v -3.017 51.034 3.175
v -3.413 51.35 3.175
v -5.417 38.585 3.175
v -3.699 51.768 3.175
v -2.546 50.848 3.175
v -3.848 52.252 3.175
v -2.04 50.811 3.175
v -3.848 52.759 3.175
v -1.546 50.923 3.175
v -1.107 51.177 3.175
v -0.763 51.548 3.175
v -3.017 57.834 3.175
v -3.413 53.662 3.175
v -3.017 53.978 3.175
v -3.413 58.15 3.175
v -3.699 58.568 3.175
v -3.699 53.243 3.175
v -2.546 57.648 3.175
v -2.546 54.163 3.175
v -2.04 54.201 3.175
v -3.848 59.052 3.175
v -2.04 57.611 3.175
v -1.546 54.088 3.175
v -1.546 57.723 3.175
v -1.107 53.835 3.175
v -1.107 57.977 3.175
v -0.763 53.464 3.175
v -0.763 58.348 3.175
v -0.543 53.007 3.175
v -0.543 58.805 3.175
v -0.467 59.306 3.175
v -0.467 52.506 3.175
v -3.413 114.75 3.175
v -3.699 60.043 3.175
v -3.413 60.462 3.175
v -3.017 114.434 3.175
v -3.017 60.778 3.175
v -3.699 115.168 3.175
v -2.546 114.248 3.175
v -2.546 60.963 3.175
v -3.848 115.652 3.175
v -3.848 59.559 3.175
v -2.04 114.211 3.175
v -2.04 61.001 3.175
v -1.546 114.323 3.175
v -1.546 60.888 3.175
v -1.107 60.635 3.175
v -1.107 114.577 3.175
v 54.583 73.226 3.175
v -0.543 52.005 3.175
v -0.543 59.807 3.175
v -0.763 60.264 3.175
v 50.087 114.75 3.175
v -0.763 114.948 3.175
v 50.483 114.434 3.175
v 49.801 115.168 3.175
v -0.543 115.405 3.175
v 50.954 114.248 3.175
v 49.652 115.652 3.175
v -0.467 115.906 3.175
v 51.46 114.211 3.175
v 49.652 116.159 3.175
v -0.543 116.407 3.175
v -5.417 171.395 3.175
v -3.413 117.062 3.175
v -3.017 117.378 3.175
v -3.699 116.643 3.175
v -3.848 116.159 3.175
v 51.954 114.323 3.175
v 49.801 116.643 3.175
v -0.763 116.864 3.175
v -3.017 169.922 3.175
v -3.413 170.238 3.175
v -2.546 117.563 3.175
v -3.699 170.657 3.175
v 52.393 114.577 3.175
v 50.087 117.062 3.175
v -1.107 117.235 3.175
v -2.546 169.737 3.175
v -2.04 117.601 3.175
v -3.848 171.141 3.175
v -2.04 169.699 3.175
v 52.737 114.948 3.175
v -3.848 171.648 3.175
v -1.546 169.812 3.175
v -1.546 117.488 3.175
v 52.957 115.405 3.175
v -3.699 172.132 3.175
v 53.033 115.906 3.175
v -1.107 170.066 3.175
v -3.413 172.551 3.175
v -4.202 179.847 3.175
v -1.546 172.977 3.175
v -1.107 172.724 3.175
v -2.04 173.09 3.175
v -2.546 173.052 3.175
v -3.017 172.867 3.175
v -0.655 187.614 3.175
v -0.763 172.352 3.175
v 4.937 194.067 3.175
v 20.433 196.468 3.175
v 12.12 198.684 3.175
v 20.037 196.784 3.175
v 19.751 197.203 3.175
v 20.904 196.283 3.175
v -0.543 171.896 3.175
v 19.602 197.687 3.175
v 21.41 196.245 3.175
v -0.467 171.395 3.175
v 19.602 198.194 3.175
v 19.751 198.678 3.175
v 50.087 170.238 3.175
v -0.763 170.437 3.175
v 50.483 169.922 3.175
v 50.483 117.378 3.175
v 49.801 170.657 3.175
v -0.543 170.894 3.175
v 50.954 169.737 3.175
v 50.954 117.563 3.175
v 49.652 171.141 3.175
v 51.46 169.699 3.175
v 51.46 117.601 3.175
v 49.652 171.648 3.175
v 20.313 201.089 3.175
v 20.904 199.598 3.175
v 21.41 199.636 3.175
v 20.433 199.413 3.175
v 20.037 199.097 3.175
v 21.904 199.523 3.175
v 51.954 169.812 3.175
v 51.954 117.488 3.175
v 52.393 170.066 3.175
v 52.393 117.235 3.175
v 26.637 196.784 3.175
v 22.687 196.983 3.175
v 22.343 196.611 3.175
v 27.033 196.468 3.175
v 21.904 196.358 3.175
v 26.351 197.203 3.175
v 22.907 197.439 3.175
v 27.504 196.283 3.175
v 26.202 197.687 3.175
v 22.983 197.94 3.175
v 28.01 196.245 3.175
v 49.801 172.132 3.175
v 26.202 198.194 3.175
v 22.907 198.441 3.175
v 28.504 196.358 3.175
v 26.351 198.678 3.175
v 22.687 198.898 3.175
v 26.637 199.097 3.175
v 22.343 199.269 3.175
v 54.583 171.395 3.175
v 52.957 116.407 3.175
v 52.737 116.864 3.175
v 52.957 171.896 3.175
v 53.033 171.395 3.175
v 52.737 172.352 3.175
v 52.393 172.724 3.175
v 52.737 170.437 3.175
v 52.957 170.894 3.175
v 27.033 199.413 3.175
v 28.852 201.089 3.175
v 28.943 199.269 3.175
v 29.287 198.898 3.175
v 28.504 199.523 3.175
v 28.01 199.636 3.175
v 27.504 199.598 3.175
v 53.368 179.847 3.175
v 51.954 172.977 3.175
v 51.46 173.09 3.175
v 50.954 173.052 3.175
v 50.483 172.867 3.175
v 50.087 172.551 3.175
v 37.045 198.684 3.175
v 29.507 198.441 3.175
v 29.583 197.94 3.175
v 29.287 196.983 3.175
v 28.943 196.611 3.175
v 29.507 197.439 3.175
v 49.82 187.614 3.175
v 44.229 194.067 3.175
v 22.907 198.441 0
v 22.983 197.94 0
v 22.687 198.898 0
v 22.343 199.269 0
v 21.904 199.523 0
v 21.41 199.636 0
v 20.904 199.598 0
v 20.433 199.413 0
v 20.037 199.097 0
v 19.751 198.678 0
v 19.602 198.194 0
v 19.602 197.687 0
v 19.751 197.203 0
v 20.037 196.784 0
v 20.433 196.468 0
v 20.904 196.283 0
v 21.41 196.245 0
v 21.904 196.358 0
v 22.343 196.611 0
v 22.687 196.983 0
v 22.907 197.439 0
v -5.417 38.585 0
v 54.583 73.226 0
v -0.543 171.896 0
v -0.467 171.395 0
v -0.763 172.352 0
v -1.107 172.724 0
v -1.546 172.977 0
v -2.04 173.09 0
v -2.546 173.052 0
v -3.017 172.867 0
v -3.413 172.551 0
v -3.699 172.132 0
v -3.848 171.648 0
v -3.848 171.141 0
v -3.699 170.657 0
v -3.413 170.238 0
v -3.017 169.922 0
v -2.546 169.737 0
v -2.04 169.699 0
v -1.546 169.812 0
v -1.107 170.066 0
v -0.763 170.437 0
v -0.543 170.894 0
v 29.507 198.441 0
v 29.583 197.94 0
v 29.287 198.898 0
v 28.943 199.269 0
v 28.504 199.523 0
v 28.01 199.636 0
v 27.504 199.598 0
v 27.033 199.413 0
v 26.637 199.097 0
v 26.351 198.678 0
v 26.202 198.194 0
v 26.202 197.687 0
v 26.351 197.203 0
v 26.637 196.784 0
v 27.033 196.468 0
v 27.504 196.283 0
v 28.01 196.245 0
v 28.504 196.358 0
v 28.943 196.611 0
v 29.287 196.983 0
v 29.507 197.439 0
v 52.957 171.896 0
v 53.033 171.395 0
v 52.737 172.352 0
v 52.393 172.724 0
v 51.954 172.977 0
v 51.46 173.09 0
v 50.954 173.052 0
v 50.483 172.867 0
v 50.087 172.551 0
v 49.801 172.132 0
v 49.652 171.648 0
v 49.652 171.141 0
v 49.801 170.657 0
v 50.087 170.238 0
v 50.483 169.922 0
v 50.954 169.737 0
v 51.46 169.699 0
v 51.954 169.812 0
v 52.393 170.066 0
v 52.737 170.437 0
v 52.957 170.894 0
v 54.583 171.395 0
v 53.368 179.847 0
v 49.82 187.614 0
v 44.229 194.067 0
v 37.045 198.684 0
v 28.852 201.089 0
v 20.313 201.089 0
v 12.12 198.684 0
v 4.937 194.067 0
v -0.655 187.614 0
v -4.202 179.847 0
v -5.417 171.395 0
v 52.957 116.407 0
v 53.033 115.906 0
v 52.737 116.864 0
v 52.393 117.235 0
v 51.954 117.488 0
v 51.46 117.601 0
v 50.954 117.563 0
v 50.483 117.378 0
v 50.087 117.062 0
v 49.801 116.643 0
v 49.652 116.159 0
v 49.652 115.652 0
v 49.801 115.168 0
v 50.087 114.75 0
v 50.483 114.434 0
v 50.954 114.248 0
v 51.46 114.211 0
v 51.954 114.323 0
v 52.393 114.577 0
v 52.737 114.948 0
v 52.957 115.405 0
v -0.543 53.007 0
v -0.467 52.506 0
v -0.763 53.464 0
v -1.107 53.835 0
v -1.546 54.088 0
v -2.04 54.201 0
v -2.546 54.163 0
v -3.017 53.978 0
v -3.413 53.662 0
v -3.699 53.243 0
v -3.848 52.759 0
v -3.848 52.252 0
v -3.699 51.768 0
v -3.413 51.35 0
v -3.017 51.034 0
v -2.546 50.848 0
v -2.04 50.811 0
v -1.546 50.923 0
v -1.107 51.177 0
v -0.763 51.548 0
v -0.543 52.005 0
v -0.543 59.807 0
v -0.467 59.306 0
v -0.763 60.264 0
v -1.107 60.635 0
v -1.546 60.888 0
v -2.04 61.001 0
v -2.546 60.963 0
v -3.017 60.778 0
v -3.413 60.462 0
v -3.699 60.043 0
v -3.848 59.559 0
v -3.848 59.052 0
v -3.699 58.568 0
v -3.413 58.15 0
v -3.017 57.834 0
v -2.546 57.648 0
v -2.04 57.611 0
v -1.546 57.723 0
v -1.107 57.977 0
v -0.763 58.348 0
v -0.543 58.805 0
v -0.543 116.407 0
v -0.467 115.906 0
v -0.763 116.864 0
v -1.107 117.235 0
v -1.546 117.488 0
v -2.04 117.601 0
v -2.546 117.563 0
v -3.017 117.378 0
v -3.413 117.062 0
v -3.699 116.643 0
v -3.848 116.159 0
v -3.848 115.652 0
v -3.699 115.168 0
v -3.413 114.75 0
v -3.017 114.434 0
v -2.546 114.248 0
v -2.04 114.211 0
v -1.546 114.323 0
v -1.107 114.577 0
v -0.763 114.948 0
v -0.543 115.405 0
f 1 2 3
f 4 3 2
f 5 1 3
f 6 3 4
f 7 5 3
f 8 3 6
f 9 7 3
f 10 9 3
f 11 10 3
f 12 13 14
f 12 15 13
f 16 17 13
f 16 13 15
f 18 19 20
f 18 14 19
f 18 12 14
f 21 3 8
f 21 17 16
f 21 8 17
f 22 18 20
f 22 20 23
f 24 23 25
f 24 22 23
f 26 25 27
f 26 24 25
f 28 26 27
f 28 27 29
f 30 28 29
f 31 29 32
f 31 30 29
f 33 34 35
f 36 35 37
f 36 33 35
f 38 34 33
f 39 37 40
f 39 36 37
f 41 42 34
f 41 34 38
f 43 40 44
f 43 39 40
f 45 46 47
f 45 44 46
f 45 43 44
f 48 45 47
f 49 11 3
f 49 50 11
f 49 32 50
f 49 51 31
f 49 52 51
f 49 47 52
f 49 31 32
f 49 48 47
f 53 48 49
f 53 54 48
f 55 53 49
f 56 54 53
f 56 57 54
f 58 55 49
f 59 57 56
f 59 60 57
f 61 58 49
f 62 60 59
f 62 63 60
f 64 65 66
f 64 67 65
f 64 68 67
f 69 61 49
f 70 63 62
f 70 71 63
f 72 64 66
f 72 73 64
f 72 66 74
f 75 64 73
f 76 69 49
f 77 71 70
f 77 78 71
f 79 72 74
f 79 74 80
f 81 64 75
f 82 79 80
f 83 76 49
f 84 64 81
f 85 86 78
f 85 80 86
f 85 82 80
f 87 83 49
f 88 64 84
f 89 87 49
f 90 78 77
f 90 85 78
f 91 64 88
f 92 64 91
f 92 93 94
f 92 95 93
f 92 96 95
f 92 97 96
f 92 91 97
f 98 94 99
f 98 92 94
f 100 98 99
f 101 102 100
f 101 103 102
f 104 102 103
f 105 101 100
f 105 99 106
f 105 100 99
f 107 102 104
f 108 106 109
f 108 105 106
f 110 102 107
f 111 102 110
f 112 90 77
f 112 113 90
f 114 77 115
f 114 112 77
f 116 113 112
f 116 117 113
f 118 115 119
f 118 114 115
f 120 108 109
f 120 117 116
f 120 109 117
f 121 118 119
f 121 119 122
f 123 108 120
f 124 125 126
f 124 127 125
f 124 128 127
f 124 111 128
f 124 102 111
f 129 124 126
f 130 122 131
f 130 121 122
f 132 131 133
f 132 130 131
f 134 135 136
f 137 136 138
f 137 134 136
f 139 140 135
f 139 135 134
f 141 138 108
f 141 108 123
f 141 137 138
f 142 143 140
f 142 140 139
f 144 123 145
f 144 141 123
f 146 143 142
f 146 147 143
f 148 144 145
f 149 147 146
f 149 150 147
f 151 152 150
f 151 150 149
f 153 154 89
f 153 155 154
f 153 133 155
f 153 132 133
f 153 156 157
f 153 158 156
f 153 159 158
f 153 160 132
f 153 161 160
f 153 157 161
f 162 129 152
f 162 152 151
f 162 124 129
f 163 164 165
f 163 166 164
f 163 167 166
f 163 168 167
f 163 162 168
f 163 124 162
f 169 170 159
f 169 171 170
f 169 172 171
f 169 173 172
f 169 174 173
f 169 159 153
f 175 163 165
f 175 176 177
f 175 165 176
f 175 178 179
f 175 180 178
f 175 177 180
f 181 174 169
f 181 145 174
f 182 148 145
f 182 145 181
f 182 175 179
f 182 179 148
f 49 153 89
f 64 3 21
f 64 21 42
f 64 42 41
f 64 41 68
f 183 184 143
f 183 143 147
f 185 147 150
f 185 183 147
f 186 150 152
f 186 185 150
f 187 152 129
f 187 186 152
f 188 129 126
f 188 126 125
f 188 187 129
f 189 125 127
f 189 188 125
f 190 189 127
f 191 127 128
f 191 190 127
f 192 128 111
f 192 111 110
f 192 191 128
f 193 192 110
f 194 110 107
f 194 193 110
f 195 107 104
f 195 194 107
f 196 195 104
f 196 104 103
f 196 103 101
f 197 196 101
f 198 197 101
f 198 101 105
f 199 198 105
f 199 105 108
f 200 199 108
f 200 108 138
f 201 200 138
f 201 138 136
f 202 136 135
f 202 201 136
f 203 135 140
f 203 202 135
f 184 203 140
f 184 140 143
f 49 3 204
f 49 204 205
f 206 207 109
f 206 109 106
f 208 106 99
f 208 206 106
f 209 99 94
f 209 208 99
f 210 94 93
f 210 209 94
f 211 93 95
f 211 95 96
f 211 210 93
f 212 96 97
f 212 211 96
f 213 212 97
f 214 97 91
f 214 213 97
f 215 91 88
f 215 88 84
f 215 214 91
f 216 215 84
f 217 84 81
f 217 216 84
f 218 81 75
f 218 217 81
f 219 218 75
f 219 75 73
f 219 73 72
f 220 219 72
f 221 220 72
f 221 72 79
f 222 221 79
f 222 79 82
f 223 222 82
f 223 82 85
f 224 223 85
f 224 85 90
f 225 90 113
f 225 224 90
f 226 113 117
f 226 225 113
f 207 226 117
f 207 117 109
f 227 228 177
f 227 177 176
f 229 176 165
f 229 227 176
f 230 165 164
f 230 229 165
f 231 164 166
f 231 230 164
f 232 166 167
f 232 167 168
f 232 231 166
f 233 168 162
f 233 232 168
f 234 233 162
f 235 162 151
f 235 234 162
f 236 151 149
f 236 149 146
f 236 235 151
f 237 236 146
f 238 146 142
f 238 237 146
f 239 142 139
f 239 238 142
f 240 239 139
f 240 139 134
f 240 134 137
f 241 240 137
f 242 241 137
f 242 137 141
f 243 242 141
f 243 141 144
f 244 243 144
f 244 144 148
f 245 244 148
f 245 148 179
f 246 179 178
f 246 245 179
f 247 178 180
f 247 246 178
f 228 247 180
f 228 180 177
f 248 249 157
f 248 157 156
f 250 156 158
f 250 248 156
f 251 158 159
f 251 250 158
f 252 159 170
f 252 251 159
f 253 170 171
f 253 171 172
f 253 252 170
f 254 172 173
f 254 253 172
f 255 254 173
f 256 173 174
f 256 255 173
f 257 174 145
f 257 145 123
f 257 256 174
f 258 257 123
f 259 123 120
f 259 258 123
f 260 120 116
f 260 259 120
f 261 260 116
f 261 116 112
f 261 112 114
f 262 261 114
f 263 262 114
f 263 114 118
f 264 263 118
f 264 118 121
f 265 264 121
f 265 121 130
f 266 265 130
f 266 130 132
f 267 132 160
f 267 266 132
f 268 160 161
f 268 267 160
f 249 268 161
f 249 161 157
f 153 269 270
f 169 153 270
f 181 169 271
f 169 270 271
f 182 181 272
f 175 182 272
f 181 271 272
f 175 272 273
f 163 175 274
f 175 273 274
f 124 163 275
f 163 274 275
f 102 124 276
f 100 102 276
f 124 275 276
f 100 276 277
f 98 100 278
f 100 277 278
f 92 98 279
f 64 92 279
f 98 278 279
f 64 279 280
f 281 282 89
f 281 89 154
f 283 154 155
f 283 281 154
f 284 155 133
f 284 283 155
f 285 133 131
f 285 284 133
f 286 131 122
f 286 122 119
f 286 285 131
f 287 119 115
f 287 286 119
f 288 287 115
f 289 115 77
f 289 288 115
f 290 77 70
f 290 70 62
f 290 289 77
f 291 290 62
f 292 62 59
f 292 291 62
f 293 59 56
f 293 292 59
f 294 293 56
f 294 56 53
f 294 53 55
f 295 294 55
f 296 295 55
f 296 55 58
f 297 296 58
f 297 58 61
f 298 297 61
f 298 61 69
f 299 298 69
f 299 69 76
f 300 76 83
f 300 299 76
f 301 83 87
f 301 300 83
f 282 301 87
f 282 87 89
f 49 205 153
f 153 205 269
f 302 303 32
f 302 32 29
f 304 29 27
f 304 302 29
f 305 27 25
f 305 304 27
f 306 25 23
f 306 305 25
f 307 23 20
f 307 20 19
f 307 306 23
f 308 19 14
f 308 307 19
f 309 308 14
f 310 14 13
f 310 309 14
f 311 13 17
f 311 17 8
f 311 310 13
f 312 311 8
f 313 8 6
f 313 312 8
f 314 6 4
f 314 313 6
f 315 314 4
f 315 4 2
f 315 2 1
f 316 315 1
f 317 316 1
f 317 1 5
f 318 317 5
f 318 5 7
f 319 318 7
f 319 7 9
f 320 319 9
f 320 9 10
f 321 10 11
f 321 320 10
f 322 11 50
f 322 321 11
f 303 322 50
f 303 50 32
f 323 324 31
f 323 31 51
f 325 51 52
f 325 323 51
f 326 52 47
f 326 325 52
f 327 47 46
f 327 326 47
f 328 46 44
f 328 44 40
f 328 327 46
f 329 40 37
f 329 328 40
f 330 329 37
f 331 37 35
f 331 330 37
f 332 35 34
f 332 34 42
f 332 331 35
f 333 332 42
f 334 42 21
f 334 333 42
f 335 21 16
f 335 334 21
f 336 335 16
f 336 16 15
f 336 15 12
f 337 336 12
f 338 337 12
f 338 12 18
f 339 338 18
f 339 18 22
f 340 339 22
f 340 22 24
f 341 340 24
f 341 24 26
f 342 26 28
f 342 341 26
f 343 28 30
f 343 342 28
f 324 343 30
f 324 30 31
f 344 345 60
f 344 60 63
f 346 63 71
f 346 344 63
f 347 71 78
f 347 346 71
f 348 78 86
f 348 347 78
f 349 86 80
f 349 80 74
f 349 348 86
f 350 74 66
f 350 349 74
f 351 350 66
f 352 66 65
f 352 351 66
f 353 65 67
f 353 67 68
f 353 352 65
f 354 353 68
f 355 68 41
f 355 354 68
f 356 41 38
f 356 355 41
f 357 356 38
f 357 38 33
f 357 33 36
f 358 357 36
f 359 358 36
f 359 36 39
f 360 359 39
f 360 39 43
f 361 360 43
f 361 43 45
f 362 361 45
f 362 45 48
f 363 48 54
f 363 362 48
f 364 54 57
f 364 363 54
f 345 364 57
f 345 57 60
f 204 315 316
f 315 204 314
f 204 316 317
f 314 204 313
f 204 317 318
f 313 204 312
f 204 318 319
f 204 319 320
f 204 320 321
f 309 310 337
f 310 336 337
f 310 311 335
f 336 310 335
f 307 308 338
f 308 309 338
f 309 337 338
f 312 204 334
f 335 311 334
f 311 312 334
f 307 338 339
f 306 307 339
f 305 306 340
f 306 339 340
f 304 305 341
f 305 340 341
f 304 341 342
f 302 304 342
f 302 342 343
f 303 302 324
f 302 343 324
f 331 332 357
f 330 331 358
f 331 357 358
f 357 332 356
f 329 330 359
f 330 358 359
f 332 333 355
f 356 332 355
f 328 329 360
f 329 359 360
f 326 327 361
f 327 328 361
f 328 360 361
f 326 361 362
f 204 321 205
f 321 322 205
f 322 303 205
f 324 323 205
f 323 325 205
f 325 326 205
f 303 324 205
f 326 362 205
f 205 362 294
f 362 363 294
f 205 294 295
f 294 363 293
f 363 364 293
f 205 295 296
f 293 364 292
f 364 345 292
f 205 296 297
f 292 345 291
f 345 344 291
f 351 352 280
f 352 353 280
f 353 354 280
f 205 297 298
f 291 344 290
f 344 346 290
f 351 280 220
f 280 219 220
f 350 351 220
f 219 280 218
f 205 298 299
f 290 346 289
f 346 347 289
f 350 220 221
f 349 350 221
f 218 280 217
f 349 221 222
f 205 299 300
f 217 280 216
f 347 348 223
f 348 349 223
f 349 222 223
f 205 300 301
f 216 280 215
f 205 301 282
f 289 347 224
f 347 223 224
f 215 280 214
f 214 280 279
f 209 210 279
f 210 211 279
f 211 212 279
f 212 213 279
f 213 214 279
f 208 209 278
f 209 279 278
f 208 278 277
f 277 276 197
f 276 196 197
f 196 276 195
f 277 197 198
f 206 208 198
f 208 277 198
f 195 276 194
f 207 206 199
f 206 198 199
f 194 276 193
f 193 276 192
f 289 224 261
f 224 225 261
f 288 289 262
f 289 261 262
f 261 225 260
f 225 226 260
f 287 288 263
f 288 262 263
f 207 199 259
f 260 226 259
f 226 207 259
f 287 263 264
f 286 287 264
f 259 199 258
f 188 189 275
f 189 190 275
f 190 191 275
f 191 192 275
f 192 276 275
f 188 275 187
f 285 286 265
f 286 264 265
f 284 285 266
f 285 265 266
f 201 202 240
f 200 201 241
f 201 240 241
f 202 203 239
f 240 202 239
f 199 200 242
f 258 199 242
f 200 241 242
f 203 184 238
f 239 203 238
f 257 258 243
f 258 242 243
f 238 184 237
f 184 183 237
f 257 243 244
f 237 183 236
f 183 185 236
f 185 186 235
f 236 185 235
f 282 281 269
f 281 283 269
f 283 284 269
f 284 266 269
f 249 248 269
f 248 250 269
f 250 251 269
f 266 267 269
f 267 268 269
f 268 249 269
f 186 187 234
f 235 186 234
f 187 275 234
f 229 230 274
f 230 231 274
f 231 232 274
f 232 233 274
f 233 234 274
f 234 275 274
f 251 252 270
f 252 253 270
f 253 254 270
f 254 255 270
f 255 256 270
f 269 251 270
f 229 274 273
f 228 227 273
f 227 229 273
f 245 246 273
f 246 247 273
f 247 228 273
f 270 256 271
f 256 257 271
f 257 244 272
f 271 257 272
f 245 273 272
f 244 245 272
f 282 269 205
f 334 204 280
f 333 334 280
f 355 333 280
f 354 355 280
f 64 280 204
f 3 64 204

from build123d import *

# Parameters (mm, degrees)
SKETCH2_R           = 1.7
BOSS_EXTRUDE1_DEPTH = 3.175
CUT_EXTRUDE1_DEPTH  = 4.175


with BuildPart() as part:
    # Sketch2 → Boss-Extrude1 (new body)
    with BuildSketch(Plane.XY):
        with BuildLine():
            Line((54.582717937, -59.58290593), (54.582717937, 171.394622999))
            ThreePointArc((54.582717937, 171.394622999), (24.582717937, 201.394622999), (-5.417282063, 171.394622999))
            Line((-5.417282063, 171.394622999), (-5.417282063, -59.58290593))
            ThreePointArc((-5.417282063, -59.58290593), (24.582717937, -89.58290593), (54.582717937, -59.58290593))
        make_face()
        with Locations((27.882717937, 197.940291196)):
            Circle(SKETCH2_R, mode=Mode.SUBTRACT)
        with Locations((-2.167282063, -59.58290593)):
            Circle(SKETCH2_R, mode=Mode.SUBTRACT)
        with Locations((5.667611541, -78.498012327)):
            Circle(SKETCH2_R, mode=Mode.SUBTRACT)
        with Locations((21.182717937, -86.115951364)):
            Circle(SKETCH2_R, mode=Mode.SUBTRACT)
        with Locations((51.332717937, 171.394622999)):
            Circle(SKETCH2_R, mode=Mode.SUBTRACT)
        with Locations((-2.167282063, 59.305858535)):
            Circle(SKETCH2_R, mode=Mode.SUBTRACT)
        with Locations((27.982717937, -86.115951364)):
            Circle(SKETCH2_R, mode=Mode.SUBTRACT)
        with Locations((-2.167282063, 171.394622999)):
            Circle(SKETCH2_R, mode=Mode.SUBTRACT)
        with Locations((51.332717937, 115.905858535)):
            Circle(SKETCH2_R, mode=Mode.SUBTRACT)
        with Locations((-2.167282063, 115.905858535)):
            Circle(SKETCH2_R, mode=Mode.SUBTRACT)
        with Locations((43.497824334, -78.498012327)):
            Circle(SKETCH2_R, mode=Mode.SUBTRACT)
        with Locations((51.332717937, -59.58290593)):
            Circle(SKETCH2_R, mode=Mode.SUBTRACT)
        with Locations((51.332717937, -34.094141465)):
            Circle(SKETCH2_R, mode=Mode.SUBTRACT)
        with Locations((-2.167282063, -34.094141465)):
            Circle(SKETCH2_R, mode=Mode.SUBTRACT)
        with Locations((51.332717937, -4.094141465)):
            Circle(SKETCH2_R, mode=Mode.SUBTRACT)
        with Locations((-2.167282063, -4.094141465)):
            Circle(SKETCH2_R, mode=Mode.SUBTRACT)
        with Locations((51.332717937, 25.905858535)):
            Circle(SKETCH2_R, mode=Mode.SUBTRACT)
        with Locations((-2.167282063, 25.905858535)):
            Circle(SKETCH2_R, mode=Mode.SUBTRACT)
        with Locations((21.282717937, 197.940291196)):
            Circle(SKETCH2_R, mode=Mode.SUBTRACT)
        with Locations((51.332717937, 52.505858535)):
            Circle(SKETCH2_R, mode=Mode.SUBTRACT)
        with Locations((51.332717937, 59.305858535)):
            Circle(SKETCH2_R, mode=Mode.SUBTRACT)
        with Locations((-2.167282063, 52.505858535)):
            Circle(SKETCH2_R, mode=Mode.SUBTRACT)
    extrude(amount=BOSS_EXTRUDE1_DEPTH)

    # Sketch3 → Cut-Extrude1 (cut, through all)
    with BuildSketch(Plane.XY.offset(3.175)):
        Polygon((-23.178598576, 28.330849589), (72.344034451, 83.480867481), (72.344034451, -133.046541286), (-23.178598576, -133.046541286), align=None)
    extrude(amount=-CUT_EXTRUDE1_DEPTH, mode=Mode.SUBTRACT)


solid = part.part
